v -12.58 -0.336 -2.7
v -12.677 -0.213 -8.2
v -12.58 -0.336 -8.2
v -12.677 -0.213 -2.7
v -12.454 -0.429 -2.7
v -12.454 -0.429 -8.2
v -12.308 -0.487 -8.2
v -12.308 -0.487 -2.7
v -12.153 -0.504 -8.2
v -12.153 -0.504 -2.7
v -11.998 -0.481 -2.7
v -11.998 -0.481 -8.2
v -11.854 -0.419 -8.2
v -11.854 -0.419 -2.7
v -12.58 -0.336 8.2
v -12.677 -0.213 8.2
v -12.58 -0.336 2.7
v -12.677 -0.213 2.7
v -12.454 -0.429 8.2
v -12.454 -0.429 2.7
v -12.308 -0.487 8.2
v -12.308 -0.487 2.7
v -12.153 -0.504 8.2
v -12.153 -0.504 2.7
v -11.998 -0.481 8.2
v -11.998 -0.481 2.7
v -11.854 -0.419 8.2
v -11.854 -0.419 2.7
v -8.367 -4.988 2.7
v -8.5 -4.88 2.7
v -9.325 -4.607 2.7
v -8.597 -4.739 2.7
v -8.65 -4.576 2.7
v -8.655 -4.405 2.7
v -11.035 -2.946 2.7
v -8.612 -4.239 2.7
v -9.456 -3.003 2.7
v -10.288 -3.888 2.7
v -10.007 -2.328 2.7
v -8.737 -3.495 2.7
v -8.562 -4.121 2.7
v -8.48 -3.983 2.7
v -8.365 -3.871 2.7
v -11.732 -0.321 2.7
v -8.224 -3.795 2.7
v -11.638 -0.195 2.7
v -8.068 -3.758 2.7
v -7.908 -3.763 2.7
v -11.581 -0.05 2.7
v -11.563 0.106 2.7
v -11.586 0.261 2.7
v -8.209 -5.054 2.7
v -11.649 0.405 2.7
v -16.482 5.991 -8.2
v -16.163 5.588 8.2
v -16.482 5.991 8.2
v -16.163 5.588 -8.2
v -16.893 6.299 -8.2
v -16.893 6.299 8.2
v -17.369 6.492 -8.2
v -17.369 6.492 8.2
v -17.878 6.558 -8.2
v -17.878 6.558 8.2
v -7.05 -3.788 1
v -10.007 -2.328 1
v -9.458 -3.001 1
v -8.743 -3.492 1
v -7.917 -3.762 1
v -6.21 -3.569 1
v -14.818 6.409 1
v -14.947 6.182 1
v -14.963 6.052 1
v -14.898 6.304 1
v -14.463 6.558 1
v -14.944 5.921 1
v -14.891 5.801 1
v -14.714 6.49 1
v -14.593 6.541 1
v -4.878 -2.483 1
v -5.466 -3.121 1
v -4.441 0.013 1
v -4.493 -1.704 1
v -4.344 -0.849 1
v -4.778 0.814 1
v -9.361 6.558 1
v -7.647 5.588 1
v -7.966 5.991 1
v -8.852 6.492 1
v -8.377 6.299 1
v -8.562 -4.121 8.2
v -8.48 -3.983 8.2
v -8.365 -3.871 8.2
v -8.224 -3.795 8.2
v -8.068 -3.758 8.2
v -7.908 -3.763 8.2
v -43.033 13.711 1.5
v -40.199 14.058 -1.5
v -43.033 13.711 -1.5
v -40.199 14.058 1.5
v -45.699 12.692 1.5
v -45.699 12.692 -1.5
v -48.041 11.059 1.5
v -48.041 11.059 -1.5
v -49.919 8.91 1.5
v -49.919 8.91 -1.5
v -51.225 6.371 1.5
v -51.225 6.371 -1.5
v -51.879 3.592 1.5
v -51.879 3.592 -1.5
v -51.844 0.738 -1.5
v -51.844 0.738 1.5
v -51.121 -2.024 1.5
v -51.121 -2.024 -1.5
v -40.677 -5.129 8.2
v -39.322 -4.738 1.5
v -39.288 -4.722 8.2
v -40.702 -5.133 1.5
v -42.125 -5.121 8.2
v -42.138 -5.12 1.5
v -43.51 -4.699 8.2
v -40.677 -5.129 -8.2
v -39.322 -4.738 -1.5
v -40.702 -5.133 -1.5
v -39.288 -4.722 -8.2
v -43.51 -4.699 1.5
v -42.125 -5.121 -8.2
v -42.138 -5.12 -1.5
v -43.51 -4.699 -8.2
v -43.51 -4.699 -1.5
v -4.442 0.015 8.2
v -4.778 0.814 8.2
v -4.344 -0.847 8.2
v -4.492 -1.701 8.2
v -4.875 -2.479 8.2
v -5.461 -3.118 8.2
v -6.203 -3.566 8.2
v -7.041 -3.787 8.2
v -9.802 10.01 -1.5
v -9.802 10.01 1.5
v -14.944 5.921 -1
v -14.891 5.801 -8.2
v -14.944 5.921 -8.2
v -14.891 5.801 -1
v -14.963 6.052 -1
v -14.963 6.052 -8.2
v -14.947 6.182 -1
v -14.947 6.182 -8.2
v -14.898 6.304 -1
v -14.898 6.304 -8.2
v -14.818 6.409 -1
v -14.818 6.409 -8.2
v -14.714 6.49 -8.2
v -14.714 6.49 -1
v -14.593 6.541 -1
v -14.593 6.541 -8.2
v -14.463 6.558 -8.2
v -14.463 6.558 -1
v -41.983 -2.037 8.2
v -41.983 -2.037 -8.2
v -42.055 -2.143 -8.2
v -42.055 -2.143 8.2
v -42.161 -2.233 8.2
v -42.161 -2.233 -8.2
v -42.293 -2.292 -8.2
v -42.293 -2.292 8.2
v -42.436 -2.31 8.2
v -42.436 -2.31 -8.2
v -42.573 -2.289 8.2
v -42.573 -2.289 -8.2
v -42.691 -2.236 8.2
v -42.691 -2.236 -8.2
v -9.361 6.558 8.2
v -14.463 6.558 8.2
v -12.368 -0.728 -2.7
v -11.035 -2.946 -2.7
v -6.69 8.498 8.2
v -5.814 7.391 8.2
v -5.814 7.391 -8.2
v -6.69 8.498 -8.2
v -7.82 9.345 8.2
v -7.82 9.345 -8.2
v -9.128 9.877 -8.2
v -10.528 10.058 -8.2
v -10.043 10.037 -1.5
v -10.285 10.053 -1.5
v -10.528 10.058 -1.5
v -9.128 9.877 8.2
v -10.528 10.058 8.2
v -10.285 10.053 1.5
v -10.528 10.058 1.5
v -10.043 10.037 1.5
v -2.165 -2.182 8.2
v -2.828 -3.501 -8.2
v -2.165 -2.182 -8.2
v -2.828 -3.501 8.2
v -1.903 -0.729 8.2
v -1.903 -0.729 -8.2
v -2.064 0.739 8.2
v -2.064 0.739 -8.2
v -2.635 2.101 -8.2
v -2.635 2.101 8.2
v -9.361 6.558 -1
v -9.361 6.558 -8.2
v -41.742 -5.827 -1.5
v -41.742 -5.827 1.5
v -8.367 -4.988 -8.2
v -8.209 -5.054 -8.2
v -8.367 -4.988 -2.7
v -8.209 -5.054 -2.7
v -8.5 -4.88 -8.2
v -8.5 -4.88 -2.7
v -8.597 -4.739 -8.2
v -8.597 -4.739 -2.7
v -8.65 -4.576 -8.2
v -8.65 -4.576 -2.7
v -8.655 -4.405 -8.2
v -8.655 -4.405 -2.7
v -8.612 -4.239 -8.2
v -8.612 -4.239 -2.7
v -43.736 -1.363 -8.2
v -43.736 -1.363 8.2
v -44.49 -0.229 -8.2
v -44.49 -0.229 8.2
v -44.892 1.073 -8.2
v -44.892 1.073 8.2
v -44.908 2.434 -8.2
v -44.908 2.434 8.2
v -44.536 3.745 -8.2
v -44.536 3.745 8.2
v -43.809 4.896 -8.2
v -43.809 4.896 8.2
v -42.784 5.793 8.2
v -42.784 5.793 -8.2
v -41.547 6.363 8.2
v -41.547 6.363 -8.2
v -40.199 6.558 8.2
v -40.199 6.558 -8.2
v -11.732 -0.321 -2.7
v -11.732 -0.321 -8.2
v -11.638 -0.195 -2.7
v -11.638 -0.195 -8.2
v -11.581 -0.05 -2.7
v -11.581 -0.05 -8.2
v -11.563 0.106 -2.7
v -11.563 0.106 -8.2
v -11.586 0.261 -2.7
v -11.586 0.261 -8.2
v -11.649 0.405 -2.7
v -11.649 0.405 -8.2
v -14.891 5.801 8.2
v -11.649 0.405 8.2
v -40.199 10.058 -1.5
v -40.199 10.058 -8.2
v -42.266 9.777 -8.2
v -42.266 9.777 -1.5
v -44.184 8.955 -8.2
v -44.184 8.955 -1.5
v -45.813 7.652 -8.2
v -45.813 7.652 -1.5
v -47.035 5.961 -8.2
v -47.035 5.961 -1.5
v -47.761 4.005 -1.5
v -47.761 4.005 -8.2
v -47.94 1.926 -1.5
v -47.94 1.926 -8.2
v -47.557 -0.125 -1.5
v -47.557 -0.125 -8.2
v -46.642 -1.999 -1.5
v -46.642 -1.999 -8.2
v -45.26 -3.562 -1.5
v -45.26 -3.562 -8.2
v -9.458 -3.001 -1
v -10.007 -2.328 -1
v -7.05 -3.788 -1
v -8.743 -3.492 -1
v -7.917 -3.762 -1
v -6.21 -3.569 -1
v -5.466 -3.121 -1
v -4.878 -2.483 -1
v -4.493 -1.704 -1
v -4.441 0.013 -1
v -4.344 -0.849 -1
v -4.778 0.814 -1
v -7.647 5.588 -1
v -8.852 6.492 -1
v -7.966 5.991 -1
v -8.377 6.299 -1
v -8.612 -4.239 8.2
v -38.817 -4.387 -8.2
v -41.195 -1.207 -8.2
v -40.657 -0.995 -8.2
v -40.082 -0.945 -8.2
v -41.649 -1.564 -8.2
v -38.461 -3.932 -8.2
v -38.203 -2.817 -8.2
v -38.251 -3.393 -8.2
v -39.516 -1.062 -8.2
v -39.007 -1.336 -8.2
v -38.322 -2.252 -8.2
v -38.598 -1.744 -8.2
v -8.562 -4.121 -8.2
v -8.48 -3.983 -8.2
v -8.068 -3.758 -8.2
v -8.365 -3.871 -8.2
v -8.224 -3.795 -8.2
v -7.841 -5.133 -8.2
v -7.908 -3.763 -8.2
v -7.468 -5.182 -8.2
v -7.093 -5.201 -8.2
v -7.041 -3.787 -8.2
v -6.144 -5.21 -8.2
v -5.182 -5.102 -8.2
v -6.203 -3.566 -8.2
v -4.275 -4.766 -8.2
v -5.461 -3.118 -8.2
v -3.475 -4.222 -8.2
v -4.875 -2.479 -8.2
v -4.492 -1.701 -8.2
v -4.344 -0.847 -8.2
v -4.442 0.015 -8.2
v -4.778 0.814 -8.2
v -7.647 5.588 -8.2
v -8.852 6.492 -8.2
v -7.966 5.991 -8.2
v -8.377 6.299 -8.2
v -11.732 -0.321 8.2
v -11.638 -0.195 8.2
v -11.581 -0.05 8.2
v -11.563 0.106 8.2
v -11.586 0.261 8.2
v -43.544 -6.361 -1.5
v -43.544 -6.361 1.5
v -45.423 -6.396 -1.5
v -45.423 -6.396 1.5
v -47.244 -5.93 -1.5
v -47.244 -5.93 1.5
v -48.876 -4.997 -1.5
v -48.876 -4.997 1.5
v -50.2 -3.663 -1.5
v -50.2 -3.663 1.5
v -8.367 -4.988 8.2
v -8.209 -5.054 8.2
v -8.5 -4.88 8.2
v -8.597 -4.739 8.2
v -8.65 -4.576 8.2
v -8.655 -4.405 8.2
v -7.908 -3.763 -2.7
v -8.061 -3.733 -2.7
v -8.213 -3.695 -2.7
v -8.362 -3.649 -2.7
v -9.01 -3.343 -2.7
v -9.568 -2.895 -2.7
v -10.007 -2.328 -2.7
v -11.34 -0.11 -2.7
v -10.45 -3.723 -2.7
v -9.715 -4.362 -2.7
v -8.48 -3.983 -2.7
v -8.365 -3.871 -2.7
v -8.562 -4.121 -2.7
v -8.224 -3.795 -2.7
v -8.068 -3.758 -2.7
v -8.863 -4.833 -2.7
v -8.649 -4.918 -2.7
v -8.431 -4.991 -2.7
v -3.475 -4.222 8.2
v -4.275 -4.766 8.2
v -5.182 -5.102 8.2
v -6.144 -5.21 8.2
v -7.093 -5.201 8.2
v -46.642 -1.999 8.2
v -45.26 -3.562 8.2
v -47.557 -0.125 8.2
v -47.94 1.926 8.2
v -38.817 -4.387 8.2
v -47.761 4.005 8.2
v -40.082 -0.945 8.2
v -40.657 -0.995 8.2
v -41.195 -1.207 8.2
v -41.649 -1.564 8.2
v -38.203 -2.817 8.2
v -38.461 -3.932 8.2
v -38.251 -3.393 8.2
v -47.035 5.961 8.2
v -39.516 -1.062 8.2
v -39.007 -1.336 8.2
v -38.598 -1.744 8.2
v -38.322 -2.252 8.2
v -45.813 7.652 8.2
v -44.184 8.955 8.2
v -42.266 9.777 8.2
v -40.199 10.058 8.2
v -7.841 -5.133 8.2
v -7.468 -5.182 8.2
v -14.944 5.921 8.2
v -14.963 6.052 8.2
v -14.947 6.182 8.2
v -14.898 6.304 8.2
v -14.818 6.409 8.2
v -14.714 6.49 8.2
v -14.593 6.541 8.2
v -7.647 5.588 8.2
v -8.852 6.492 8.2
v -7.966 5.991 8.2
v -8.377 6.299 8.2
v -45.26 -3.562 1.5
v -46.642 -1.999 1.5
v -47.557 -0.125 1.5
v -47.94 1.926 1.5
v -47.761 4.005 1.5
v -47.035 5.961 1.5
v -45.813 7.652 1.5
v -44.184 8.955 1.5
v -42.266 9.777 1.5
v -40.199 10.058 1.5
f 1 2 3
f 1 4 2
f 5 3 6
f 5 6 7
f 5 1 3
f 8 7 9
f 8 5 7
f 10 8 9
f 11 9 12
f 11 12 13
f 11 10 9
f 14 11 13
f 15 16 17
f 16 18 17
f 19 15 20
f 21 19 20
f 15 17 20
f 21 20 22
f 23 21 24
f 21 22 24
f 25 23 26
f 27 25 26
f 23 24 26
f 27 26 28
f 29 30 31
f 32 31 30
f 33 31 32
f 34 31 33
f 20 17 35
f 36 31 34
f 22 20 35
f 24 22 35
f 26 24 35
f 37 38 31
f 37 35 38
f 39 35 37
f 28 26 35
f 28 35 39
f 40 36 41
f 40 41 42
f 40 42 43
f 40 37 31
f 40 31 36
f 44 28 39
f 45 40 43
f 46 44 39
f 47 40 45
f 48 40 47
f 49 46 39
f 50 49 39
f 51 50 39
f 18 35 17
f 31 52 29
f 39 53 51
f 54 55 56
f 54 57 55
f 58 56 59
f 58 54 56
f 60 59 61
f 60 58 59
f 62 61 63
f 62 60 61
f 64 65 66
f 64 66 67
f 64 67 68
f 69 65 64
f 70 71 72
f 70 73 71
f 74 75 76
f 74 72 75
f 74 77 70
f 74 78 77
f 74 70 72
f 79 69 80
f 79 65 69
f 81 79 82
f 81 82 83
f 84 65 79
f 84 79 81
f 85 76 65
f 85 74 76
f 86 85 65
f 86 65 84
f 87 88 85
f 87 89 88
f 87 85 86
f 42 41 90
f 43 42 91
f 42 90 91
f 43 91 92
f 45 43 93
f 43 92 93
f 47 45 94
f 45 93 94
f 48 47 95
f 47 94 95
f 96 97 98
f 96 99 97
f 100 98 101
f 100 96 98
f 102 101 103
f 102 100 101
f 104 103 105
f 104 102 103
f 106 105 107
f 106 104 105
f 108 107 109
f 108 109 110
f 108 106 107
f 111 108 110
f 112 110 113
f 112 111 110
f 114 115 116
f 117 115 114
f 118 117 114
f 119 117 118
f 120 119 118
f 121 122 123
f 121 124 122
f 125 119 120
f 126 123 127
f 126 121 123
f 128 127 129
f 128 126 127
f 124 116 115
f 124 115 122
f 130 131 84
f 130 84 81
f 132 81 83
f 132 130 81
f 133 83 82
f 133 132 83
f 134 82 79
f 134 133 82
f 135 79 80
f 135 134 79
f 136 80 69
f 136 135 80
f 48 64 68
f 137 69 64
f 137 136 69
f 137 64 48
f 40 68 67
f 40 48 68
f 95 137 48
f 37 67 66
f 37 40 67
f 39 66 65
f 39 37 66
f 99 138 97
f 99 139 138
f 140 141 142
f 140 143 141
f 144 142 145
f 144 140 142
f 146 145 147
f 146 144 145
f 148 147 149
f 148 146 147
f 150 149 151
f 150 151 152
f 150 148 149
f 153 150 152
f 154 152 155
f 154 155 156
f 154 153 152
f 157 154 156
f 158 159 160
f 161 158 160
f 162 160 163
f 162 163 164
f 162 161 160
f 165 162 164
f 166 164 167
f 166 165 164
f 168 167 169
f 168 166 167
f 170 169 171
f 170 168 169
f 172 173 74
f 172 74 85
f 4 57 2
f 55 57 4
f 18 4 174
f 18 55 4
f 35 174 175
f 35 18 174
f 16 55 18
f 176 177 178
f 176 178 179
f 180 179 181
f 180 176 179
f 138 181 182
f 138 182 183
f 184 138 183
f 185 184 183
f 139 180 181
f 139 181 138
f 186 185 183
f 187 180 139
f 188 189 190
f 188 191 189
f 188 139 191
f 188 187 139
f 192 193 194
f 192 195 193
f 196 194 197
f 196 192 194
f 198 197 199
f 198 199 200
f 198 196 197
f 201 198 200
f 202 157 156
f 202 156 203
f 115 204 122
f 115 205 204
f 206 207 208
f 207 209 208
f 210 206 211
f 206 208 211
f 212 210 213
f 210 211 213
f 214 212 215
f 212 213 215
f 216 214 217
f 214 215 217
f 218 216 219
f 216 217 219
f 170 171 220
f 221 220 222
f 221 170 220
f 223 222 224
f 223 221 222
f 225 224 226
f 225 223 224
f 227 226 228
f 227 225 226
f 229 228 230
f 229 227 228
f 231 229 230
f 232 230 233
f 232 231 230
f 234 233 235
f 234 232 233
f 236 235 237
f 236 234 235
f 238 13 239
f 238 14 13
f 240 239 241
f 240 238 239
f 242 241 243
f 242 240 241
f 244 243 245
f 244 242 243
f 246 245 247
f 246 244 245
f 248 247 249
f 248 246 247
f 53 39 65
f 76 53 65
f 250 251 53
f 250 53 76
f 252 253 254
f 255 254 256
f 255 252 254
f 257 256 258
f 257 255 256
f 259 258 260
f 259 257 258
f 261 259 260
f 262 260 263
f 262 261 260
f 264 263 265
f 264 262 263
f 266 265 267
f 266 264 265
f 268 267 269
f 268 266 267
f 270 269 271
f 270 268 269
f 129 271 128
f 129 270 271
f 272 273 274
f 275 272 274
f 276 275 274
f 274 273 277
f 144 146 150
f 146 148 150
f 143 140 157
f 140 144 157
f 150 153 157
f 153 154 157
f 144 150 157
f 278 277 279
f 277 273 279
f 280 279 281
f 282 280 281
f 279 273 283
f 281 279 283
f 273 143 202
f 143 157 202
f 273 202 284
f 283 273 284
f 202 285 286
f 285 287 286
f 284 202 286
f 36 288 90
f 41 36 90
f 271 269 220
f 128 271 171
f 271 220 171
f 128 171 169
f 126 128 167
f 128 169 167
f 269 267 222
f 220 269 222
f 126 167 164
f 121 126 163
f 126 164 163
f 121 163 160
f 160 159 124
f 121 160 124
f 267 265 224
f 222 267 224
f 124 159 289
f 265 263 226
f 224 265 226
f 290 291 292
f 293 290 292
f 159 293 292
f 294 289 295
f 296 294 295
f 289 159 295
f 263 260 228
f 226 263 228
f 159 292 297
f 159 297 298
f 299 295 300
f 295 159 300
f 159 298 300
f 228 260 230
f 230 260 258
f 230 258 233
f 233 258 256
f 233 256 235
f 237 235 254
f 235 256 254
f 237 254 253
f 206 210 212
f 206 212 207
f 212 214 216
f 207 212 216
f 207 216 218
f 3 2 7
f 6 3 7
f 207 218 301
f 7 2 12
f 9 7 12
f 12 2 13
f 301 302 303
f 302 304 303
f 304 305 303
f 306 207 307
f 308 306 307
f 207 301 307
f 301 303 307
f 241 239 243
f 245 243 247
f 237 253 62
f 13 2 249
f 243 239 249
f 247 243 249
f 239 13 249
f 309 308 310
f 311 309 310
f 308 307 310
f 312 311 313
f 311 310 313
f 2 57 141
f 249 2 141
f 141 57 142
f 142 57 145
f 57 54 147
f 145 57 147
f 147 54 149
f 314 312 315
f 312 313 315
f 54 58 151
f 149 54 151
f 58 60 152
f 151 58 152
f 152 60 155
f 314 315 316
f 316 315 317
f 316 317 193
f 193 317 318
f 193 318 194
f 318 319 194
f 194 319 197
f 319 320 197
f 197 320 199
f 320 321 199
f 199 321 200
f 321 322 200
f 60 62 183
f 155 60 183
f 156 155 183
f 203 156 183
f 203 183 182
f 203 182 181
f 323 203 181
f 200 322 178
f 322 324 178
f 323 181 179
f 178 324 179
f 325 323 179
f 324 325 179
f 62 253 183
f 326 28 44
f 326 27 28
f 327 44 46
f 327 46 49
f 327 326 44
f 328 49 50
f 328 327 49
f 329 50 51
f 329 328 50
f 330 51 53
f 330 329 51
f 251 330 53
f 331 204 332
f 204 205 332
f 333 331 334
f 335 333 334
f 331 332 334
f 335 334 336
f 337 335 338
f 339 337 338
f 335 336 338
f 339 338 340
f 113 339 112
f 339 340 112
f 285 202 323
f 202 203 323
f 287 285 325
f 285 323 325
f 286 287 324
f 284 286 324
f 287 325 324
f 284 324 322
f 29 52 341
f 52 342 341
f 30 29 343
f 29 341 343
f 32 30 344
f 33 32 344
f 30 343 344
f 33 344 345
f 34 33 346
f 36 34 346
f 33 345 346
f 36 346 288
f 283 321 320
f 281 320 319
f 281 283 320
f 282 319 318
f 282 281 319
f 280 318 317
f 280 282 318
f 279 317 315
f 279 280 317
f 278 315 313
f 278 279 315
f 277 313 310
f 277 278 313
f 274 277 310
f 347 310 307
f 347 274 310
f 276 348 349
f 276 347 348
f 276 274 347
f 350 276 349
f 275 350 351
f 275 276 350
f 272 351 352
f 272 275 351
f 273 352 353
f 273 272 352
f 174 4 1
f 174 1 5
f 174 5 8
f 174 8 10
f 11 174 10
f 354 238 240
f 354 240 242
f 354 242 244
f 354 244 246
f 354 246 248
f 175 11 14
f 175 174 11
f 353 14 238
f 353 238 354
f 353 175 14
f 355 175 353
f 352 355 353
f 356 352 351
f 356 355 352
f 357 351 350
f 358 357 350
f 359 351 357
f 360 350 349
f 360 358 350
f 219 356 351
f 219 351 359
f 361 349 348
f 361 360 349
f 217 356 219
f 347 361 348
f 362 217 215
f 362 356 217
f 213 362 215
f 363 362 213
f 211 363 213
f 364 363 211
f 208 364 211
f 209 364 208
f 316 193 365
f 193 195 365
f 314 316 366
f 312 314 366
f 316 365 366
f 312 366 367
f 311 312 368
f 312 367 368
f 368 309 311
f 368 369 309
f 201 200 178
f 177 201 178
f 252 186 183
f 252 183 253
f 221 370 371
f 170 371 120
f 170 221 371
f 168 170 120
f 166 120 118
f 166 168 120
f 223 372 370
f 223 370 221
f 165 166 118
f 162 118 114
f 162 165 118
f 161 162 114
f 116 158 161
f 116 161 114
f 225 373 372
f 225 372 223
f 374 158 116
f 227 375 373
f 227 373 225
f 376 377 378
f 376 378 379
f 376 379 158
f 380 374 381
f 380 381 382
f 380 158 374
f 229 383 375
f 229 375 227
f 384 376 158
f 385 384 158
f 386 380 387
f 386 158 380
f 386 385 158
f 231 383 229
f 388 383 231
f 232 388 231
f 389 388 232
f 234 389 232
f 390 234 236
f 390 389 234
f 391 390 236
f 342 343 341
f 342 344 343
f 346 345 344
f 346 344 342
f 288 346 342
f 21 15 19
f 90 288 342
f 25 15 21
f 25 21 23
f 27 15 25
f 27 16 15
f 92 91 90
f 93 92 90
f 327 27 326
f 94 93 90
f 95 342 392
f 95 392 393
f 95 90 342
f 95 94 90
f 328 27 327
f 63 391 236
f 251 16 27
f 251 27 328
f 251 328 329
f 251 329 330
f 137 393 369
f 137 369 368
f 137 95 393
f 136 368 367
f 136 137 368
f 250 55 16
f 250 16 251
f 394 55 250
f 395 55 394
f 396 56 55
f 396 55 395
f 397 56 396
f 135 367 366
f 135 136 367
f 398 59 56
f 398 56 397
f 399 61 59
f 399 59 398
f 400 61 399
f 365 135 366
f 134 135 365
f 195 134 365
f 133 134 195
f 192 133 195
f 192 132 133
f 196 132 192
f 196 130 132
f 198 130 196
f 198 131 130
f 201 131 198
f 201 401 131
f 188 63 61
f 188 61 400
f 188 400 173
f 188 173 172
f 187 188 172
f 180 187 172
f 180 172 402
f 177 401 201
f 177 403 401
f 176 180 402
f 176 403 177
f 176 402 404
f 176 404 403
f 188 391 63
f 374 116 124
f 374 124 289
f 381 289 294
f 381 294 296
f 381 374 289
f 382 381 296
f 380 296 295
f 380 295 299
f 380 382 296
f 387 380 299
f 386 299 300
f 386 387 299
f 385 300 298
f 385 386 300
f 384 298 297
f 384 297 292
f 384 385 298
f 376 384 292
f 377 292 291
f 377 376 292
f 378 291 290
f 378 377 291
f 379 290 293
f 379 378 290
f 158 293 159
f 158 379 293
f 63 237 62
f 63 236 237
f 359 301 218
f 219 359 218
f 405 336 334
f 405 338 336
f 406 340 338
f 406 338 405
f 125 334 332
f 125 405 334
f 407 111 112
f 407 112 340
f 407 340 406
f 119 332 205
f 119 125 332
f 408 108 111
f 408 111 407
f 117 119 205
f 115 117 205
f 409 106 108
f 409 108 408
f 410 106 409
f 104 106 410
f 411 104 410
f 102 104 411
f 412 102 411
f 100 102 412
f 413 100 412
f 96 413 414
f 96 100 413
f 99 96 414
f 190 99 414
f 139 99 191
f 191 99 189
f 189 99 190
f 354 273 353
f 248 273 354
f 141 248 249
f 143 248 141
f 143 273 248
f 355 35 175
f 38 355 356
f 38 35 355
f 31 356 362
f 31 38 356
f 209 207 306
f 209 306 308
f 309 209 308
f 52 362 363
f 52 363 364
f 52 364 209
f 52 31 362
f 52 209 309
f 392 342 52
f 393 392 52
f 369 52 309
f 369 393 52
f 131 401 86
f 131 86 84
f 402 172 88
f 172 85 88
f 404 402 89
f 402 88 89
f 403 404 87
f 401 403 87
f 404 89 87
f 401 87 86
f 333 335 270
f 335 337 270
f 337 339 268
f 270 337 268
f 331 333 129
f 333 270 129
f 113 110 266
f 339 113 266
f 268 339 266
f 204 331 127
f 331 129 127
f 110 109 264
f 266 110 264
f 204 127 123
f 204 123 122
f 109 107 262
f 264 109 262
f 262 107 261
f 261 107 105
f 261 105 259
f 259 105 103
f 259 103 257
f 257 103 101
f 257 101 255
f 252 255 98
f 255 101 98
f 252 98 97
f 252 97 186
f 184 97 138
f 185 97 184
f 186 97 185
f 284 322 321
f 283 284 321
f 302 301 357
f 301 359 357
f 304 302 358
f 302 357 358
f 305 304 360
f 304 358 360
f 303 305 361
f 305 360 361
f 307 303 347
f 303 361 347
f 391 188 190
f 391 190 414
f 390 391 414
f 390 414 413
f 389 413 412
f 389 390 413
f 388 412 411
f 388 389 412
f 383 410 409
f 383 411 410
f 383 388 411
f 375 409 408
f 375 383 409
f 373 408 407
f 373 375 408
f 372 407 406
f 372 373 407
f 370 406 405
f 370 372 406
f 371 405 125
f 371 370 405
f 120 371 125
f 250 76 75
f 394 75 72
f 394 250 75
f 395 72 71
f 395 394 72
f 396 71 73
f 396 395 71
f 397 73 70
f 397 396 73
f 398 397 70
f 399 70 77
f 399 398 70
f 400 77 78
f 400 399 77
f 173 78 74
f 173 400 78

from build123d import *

# Parameters (mm, degrees)
F1_DEPTH    = 8.2
F2_DEPTH    = 1
F4_DEPTH    = 5.5
F15_DEPTH   = 5.5
F5_R        = 2
F16_R       = 0.5
F17_R       = 2
F18_R       = 5
F19_R       = 0.5
F6_R        = 0.59999
F8_DEPTH    = 8.2
F9_T1_DEPTH = 31.0823571676
F10_R       = 4
F12_DEPTH   = 1.5
F13_R       = 7


# Not quite as in the source:
# - a fillet or chamfer that OpenCascade refuses, or shapes differently, is made with other operations: its cross-section is extruded or revolved along the edge and cut away or added
# - a fillet or chamfer is up to 0.001 mm smaller than in the source, because OpenCascade refuses the exact size


with BuildPart() as f1:
    # F0 (on Top) → F1 (new body, symmetric)
    with BuildSketch(Plane.XY):
        with BuildLine():
            Line((-7.6991717756, 9.5581562555), (-40.1991717756, 9.5581562555))
            ThreePointArc((-40.1991717756, 9.5581562555), (-47.4491717756, 2.3081562555), (-40.1991717756, -4.9418437445))
            ThreePointArc((-40.1991717756, -4.9418437445), (-38.6431985652, -1.6852820196), (-42.1543481568, -2.5207911129))
            ThreePointArc((-42.1543481568, -2.5207911129), (-44.8427156809, 2.8081562555), (-40.1991717756, 6.5581562555))
            Line((-40.1991717756, 6.5581562555), (-16.7462805126, 6.5581562555))
            Line((-16.7462805126, 6.5581562555), (-11.035484998, -2.9462035475))
            ThreePointArc((-11.035484998, -2.9462035475), (-4.6547300014, -4.5371044474), (-3.0638291014, 1.8436505492))
            Line((-3.0638291014, 1.8436505492), (-7.6991717756, 9.5581562555))
        make_face()
        with BuildLine():
            Line((-15.346320436, 6.5581562555), (-8.229856713, 6.5581562555))
            Line((-8.229856713, 6.5581562555), (-4.7781637028, 0.8135743994))
            ThreePointArc((-4.7781637028, 0.8135743994), (-5.8216578415, -3.3716519963), (-10.0068842371, -2.3281578576))
            Line((-10.0068842371, -2.3281578576), (-15.346320436, 6.5581562555))
        make_face(mode=Mode.SUBTRACT)
    extrude(amount=F1_DEPTH, both=True)

    # F0 (on Top) → F2 (join, symmetric)
    with BuildSketch(Plane.XY):
        with BuildLine():
            Line((-4.7781637028, 0.8135743994), (-8.229856713, 6.5581562555))
            Line((-8.229856713, 6.5581562555), (-15.346320436, 6.5581562555))
            Line((-15.346320436, 6.5581562555), (-10.0068842371, -2.3281578576))
            ThreePointArc((-10.0068842371, -2.3281578576), (-5.8216578415, -3.3716519963), (-4.7781637028, 0.8135743994))
        make_face()
    extrude(amount=F2_DEPTH, both=True)

    # F3 (on face) → F4 (cut)
    with BuildSketch(Plane.XY.offset(8.2)):
        Polygon((-9.8084988335, -7.0643632576), (-7.0496570497, -0.5512764992), (-8.3826289276, 1.6671612479), (-13.2850058391, -1.2784839779), align=None)
    extrude(amount=-F4_DEPTH, mode=Mode.SUBTRACT)

    # F14 (on face) → F15 (cut)
    with BuildSketch(Plane(origin=(0, 0, -8.2), x_dir=(1, 0, 0), z_dir=(0, 0, -1))):
        with BuildLine():
            Line((-12.3684568759, 0.7277658005), (-11.3398561151, 0.1097201106))
            Line((-11.3398561151, 0.1097201106), (-10.0068842371, 2.3281578576))
            ThreePointArc((-10.0068842371, 2.3281578576), (-9.3022346771, 3.1354223006), (-8.3618696665, 3.649154264))
            Line((-8.3618696665, 3.649154264), (-8.8633257373, 4.8329941325))
            ThreePointArc((-8.8633257373, 4.8329941325), (-10.099006978, 4.0618270279), (-11.035484998, 2.9462035475))
            Line((-11.035484998, 2.9462035475), (-12.3684568759, 0.7277658005))
        make_face()
    extrude(amount=-F15_DEPTH, mode=Mode.SUBTRACT)

    # F5
    f5_edges = [f1.edges().sort_by_distance(p)[0] for p in [
        (-16.746281, 6.558156, 0),
    ]]
    fillet(f5_edges, radius=F5_R)

    # F16
    f16_edges = [f1.edges().sort_by_distance(p)[0] for p in [
        (-15.34632, 6.558156, -4.6),
        (-15.34632, 6.558156, 4.6),
    ]]
    fillet(f16_edges, radius=F16_R)

    # F17
    f17_edges = [f1.edges().sort_by_distance(p)[0] for p in [
        (-8.229857, 6.558156, -4.6),
        (-8.229857, 6.558156, 4.6),
    ]]
    fillet(f17_edges, radius=F17_R)

    # F18
    f18_edges = [f1.edges().sort_by_distance(p)[0] for p in [
        (-7.699172, 9.558156, 0),
    ]]
    fillet(f18_edges, radius=F18_R)

    # F19
    f19_edges = [f1.edges().sort_by_distance(p)[0] for p in [
        (-42.154348, -2.520791, 0),
    ]]
    fillet(f19_edges, radius=F19_R)

    # F6 (radius 0.6 in the source; OpenCascade refuses exactly that, so slightly less here)
    f6_edges = [f1.edges().sort_by_distance(p)[0] for p in [
        (-12.368457, -0.727766, 5.45),
        (-11.339856, -0.10972, 5.45),
        (-8.36187, -3.649154, 5.45),
        (-8.863326, -4.832994, 5.45),
        (-8.863326, -4.832994, -5.45),
        (-8.36187, -3.649154, -5.45),
        (-12.368457, -0.727766, -5.45),
        (-11.339856, -0.10972, -5.45),
    ]]
    fillet(f6_edges, radius=F6_R)

    # F7 (on Top) → F8 (join, symmetric)
    with BuildSketch(Plane.XY):
        with BuildLine():
            ThreePointArc((-40.1991717756, -4.9418437445), (-47.4491717756, 2.3081562555), (-40.1991717756, 9.5581562555))
            Line((-40.1991717756, 9.5581562555), (-10.5280356666, 9.5581562555))
            ThreePointArc((-10.5280356666, 9.5581562555), (-8.065917866, 8.9099347352), (-6.242199163, 7.13334663))
            Line((-6.242199163, 7.13334663), (-3.0638291014, 1.8436505492))
            ThreePointArc((-3.0638291014, 1.8436505492), (-3.0131583432, -2.8597777863), (-7.0927569488, -5.2010767528))
            Line((-7.0927569488, -5.2010767528), (-4.8792576743, -5.2215941063))
            ThreePointArc((-4.8792576743, -5.2215941063), (-2.1256697511, -2.0601996528), (-2.6352454511, 2.1011695866))
            Line((-2.6352454511, 2.1011695866), (-5.8136155127, 7.3908656675))
            ThreePointArc((-5.8136155127, 7.3908656675), (-7.819706086, 9.3451125832), (-10.5280356666, 10.0581562555))
            Line((-10.5280356666, 10.0581562555), (-40.1991717756, 10.0581562555))
            ThreePointArc((-40.1991717756, 10.0581562555), (-47.9456545804, 2.5416175049), (-40.6658823702, -5.4277781561))
            Line((-40.6658823702, -5.4277781561), (-39.2876185276, -4.7220321267))
            ThreePointArc((-39.2876185276, -4.7220321267), (-39.7303310587, -4.8861144001), (-40.1991717756, -4.9418437445))
        make_face()
    extrude(amount=F8_DEPTH, both=True)

    # F9: fillet of radius 5 on 1 edges, made by hand

    # F9_s2 → F9_t1 (cut)
    with BuildSketch(Plane.XY.offset(-15.5411785838)):
        with BuildLine():
            ThreePointArc((-39.2876185276, -4.7220321267), (-41.4015983231, -5.1781218435), (-43.5104409693, -4.6988399859))
            Line((-43.5104409693, -4.6988399859), (-43.5531670234, -4.7892528406))
            ThreePointArc((-43.5531670234, -4.7892528406), (-42.1478250371, -5.2961353267), (-40.6719044424, -5.5275966647))
            Line((-40.6719044424, -5.5275966647), (-40.6203047078, -5.5167875752))
            ThreePointArc((-40.6203047078, -5.5167875752), (-39.9311727865, -5.1639145605), (-39.2458881329, -4.8129088242))
            Line((-39.2458881329, -4.8129088242), (-39.2876185276, -4.7220321267))
        make_face()
    extrude(amount=F9_T1_DEPTH, mode=Mode.SUBTRACT)

    # F10
    f10_edges = [f1.edges().sort_by_distance(p)[0] for p in [
        (-4.879258, -5.221594, 0),
    ]]
    fillet(f10_edges, radius=F10_R)

    # F11 (on Top) → F12 (join, symmetric)
    with BuildSketch(Plane.XY):
        with BuildLine():
            Line((-9.8019854711, 10.0100230104), (-40.1991717756, 14.0581562555))
            ThreePointArc((-40.1991717756, 14.0581562555), (-51.5354352526, 5.3987274618), (-46.1626661567, -7.8160343179))
            Line((-46.1626661567, -7.8160343179), (-39.3222752617, -4.7377869483))
            ThreePointArc((-39.3222752617, -4.7377869483), (-41.4206326973, -5.1779810716), (-43.5104409693, -4.6988399859))
            ThreePointArc((-43.5104409693, -4.6988399859), (-47.7611398022, 4.0049590032), (-40.1991717756, 10.0581562555))
            Line((-40.1991717756, 10.0581562555), (-10.5280356666, 10.0581562555))
            ThreePointArc((-10.5280356666, 10.0581562555), (-10.1642136992, 10.0461097517), (-9.8019854711, 10.0100230104))
        make_face()
    extrude(amount=F12_DEPTH, both=True)

    # F13
    f13_edges = [f1.edges().sort_by_distance(p)[0] for p in [
        (-46.162666, -7.816034, 0),
    ]]
    fillet(f13_edges, radius=F13_R)


solid = f1.part
